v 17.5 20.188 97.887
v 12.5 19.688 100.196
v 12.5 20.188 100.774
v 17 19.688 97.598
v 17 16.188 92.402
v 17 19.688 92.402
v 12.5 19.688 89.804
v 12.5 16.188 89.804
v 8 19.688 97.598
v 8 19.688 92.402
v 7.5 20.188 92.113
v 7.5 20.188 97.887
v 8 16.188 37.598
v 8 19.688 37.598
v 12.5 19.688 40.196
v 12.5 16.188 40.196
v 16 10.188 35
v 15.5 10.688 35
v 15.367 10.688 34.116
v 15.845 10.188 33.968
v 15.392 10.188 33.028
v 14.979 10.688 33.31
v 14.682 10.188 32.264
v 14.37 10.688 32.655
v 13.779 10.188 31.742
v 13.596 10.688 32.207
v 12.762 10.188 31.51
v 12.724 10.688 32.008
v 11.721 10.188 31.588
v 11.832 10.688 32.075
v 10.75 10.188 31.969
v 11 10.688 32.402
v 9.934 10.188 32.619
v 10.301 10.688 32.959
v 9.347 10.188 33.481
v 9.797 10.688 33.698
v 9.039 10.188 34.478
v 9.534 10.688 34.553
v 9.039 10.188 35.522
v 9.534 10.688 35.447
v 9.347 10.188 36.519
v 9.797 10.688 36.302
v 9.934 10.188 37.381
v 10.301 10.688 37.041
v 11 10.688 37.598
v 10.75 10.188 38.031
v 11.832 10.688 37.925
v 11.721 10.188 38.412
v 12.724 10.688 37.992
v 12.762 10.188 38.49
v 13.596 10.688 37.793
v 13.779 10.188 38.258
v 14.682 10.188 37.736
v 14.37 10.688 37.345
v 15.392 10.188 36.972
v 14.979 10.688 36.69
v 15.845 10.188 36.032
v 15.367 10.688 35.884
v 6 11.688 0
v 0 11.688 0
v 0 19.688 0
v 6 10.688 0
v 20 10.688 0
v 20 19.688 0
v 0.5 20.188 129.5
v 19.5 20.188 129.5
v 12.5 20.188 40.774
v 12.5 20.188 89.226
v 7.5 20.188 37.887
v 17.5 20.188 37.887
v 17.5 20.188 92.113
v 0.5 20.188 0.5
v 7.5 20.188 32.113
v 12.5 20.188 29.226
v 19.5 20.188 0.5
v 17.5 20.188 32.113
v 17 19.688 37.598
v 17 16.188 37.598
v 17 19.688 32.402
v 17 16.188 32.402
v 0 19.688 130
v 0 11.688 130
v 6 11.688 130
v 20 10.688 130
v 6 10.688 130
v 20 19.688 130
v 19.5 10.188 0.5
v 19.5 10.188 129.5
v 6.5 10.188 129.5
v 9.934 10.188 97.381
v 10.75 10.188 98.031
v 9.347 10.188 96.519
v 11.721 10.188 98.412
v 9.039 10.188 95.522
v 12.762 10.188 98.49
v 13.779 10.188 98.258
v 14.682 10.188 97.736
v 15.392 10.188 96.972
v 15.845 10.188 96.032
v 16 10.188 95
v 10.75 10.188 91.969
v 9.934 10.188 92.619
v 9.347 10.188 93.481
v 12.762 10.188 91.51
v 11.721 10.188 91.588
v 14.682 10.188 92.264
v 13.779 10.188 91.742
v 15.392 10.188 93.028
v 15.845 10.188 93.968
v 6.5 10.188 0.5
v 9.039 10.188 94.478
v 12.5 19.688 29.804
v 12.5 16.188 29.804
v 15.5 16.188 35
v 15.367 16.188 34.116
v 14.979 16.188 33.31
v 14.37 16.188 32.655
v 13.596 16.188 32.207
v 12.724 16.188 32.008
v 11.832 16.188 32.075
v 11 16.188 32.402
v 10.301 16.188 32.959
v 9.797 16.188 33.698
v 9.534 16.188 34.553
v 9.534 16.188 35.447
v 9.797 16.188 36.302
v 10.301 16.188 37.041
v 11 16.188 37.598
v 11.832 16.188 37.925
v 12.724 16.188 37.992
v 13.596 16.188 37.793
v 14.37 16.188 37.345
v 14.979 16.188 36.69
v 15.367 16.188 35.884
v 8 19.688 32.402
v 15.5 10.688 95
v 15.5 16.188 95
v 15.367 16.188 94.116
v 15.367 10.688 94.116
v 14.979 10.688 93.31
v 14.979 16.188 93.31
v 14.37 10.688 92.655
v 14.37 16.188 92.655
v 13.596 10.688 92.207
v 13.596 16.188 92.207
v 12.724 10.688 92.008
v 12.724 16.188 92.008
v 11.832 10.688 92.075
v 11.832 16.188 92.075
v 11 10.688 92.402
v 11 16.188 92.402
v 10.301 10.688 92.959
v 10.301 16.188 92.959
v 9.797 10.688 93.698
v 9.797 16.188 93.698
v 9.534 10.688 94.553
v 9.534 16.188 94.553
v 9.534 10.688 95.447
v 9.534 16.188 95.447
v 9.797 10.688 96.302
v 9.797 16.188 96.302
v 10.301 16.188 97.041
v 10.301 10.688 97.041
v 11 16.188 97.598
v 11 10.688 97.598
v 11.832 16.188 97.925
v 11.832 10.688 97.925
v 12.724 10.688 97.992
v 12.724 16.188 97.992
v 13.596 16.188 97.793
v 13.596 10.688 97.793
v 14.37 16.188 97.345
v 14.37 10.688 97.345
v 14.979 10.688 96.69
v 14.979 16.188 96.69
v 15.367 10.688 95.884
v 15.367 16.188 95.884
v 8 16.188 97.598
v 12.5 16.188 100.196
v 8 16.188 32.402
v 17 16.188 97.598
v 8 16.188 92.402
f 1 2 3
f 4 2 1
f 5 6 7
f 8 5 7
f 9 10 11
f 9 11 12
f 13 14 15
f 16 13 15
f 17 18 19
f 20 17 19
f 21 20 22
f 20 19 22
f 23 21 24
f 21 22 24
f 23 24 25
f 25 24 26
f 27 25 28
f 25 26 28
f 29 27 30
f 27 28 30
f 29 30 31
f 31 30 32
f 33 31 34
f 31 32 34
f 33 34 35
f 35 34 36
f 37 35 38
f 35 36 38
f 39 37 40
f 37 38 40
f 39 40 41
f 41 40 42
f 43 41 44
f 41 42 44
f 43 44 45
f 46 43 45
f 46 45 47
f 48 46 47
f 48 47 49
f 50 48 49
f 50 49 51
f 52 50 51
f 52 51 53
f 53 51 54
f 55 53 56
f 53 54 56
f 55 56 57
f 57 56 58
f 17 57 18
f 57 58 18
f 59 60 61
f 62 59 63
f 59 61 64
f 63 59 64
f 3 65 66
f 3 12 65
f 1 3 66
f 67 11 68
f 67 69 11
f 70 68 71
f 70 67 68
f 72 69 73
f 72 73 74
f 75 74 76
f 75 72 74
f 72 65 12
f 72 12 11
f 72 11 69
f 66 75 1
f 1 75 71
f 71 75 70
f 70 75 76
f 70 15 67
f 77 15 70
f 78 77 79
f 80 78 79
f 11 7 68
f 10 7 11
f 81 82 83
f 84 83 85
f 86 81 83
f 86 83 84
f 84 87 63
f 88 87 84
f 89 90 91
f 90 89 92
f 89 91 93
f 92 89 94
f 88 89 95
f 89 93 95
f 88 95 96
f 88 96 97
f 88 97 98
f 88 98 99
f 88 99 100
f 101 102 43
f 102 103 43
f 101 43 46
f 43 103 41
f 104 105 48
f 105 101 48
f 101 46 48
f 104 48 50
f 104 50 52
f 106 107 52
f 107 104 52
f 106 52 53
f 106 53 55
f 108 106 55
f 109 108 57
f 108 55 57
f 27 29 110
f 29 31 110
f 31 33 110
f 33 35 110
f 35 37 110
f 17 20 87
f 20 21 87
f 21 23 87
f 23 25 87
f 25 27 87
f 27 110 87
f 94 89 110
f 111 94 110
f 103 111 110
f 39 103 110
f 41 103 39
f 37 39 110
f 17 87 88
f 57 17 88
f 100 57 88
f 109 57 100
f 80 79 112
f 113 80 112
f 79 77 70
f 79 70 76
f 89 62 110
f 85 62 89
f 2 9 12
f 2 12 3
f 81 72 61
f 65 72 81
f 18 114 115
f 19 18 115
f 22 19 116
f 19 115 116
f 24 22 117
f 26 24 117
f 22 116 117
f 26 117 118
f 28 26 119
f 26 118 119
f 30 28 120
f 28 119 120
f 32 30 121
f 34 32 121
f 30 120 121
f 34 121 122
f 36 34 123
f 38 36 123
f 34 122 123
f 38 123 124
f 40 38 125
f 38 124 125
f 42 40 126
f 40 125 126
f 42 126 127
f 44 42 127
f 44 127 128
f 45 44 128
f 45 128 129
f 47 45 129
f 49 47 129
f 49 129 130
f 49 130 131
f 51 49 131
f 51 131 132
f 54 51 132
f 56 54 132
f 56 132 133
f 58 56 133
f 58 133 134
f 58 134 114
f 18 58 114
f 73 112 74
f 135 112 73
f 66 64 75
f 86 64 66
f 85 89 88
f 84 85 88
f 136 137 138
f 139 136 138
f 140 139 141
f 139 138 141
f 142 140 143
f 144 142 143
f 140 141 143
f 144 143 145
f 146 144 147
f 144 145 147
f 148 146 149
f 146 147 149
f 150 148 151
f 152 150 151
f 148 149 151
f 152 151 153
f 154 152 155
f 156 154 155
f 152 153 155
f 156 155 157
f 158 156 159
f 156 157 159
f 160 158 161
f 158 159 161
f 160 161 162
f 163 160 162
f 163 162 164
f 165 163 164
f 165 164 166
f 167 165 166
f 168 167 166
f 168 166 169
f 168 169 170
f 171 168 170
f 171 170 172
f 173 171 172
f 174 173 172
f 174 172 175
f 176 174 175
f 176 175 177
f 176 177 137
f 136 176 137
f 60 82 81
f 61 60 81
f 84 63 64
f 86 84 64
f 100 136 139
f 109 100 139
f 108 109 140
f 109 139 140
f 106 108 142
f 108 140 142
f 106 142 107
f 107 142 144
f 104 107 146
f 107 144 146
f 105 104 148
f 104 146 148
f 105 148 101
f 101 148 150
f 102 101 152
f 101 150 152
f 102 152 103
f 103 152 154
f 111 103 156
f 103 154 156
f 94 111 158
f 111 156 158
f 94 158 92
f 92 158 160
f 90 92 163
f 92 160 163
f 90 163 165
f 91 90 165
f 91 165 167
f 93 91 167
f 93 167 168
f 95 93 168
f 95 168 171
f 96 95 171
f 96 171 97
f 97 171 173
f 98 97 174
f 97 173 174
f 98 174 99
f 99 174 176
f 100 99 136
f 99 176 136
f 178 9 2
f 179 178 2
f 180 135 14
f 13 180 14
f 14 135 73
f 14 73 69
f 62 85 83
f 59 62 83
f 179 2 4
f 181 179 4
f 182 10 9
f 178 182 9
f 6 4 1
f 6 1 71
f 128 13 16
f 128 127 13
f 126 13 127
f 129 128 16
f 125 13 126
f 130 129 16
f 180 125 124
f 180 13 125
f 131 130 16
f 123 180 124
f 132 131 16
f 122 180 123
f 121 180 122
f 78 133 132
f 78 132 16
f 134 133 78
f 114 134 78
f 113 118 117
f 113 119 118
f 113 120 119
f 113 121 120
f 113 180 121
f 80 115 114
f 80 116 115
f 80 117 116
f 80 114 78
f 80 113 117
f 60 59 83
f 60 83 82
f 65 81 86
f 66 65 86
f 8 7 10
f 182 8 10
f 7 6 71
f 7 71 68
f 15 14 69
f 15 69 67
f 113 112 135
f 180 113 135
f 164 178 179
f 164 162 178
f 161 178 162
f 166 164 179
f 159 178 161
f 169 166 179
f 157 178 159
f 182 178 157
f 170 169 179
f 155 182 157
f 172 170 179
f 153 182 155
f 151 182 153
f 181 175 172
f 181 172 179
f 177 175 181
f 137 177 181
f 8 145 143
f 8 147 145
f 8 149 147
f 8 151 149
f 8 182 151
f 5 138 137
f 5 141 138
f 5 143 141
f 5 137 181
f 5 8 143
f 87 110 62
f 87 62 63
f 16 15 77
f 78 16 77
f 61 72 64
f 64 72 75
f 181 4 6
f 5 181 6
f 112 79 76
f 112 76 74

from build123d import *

# Parameters (mm, degrees)
SKETCH1_W           = 20
SKETCH1_H           = 10
BOSS_EXTRUDE1_DEPTH = 130
SKETCH2_R           = 3
CUT_EXTRUDE1_DEPTH  = 140
CUT_EXTRUDE2_DEPTH  = 4
LPATTERN1_COUNT     = 2
LPATTERN1_PITCH     = 60
SKETCH4_W           = 6
SKETCH4_H           = 1.5
CUT_EXTRUDE3_DEPTH  = 200
CHAMFER1_SIZE       = 0.5


with BuildPart() as part:
    # Sketch1 → Boss-Extrude1 (new body)
    with BuildSketch(Plane.XY):
        with Locations((10, 15.187969925)):
            Rectangle(SKETCH1_W, SKETCH1_H)
    extrude(amount=BOSS_EXTRUDE1_DEPTH)

    # Sketch2 → Cut-Extrude1 (cut)
    with BuildSketch(Plane(origin=(0, 20.187969925, 0), x_dir=(1, 0, 0), z_dir=(0, 1, 0))):
        with Locations((12.5, -35)):
            Circle(SKETCH2_R)
    cut_extrude1 = extrude(amount=-CUT_EXTRUDE1_DEPTH, mode=Mode.SUBTRACT)

    # Sketch3 → Cut-Extrude2 (cut)
    with BuildSketch(Plane(origin=(0, 20.187969925, 0), x_dir=(1, 0, 0), z_dir=(0, 1, 0))):
        Polygon((12.5, -29.803847577), (8, -32.401923789), (8, -37.598076211), (12.5, -40.196152423), (17, -37.598076211), (17, -32.401923789), align=None)
    cut_extrude2 = extrude(amount=-CUT_EXTRUDE2_DEPTH, mode=Mode.SUBTRACT)

    # LPattern1: Cut-Extrude1, Cut-Extrude2 ×2
    with Locations(*[(0, 0, i * LPATTERN1_PITCH) for i in range(1, LPATTERN1_COUNT)]):
        add(cut_extrude1, mode=Mode.SUBTRACT)
        add(cut_extrude2, mode=Mode.SUBTRACT)

    # Sketch4 → Cut-Extrude3 (cut)
    with BuildSketch(Plane(origin=(0, 0, 0), x_dir=(-1, 0, 0), z_dir=(0, 0, -1))):
        with Locations((-3, 10.937969925)):
            Rectangle(SKETCH4_W, SKETCH4_H)
    extrude(amount=-CUT_EXTRUDE3_DEPTH, mode=Mode.SUBTRACT)

    # Chamfer1
    chamfer1_edges = [part.edges().sort_by_distance(p)[0] for p in [
        (9.5, 10.187969925, 35),
        (14.75, 20.187969925, 31.102885683),
        (10.25, 20.187969925, 31.102885683),
        (8, 20.187969925, 35),
        (10.25, 20.187969925, 38.897114317),
        (14.75, 20.187969925, 38.897114317),
        (17, 20.187969925, 35),
        (9.5, 10.187969925, 95),
        (14.75, 20.187969925, 91.102885683),
        (10.25, 20.187969925, 91.102885683),
        (8, 20.187969925, 95),
        (10.25, 20.187969925, 98.897114317),
        (14.75, 20.187969925, 98.897114317),
        (17, 20.187969925, 95),
        (10, 20.187969925, 0),
        (13, 10.187969925, 0),
        (13, 10.187969925, 130),
        (6, 10.187969925, 65),
        (20, 10.187969925, 65),
        (0, 20.187969925, 65),
        (20, 20.187969925, 65),
        (10, 20.187969925, 130),
    ]]
    chamfer(chamfer1_edges, length=CHAMFER1_SIZE)


solid = part.part
